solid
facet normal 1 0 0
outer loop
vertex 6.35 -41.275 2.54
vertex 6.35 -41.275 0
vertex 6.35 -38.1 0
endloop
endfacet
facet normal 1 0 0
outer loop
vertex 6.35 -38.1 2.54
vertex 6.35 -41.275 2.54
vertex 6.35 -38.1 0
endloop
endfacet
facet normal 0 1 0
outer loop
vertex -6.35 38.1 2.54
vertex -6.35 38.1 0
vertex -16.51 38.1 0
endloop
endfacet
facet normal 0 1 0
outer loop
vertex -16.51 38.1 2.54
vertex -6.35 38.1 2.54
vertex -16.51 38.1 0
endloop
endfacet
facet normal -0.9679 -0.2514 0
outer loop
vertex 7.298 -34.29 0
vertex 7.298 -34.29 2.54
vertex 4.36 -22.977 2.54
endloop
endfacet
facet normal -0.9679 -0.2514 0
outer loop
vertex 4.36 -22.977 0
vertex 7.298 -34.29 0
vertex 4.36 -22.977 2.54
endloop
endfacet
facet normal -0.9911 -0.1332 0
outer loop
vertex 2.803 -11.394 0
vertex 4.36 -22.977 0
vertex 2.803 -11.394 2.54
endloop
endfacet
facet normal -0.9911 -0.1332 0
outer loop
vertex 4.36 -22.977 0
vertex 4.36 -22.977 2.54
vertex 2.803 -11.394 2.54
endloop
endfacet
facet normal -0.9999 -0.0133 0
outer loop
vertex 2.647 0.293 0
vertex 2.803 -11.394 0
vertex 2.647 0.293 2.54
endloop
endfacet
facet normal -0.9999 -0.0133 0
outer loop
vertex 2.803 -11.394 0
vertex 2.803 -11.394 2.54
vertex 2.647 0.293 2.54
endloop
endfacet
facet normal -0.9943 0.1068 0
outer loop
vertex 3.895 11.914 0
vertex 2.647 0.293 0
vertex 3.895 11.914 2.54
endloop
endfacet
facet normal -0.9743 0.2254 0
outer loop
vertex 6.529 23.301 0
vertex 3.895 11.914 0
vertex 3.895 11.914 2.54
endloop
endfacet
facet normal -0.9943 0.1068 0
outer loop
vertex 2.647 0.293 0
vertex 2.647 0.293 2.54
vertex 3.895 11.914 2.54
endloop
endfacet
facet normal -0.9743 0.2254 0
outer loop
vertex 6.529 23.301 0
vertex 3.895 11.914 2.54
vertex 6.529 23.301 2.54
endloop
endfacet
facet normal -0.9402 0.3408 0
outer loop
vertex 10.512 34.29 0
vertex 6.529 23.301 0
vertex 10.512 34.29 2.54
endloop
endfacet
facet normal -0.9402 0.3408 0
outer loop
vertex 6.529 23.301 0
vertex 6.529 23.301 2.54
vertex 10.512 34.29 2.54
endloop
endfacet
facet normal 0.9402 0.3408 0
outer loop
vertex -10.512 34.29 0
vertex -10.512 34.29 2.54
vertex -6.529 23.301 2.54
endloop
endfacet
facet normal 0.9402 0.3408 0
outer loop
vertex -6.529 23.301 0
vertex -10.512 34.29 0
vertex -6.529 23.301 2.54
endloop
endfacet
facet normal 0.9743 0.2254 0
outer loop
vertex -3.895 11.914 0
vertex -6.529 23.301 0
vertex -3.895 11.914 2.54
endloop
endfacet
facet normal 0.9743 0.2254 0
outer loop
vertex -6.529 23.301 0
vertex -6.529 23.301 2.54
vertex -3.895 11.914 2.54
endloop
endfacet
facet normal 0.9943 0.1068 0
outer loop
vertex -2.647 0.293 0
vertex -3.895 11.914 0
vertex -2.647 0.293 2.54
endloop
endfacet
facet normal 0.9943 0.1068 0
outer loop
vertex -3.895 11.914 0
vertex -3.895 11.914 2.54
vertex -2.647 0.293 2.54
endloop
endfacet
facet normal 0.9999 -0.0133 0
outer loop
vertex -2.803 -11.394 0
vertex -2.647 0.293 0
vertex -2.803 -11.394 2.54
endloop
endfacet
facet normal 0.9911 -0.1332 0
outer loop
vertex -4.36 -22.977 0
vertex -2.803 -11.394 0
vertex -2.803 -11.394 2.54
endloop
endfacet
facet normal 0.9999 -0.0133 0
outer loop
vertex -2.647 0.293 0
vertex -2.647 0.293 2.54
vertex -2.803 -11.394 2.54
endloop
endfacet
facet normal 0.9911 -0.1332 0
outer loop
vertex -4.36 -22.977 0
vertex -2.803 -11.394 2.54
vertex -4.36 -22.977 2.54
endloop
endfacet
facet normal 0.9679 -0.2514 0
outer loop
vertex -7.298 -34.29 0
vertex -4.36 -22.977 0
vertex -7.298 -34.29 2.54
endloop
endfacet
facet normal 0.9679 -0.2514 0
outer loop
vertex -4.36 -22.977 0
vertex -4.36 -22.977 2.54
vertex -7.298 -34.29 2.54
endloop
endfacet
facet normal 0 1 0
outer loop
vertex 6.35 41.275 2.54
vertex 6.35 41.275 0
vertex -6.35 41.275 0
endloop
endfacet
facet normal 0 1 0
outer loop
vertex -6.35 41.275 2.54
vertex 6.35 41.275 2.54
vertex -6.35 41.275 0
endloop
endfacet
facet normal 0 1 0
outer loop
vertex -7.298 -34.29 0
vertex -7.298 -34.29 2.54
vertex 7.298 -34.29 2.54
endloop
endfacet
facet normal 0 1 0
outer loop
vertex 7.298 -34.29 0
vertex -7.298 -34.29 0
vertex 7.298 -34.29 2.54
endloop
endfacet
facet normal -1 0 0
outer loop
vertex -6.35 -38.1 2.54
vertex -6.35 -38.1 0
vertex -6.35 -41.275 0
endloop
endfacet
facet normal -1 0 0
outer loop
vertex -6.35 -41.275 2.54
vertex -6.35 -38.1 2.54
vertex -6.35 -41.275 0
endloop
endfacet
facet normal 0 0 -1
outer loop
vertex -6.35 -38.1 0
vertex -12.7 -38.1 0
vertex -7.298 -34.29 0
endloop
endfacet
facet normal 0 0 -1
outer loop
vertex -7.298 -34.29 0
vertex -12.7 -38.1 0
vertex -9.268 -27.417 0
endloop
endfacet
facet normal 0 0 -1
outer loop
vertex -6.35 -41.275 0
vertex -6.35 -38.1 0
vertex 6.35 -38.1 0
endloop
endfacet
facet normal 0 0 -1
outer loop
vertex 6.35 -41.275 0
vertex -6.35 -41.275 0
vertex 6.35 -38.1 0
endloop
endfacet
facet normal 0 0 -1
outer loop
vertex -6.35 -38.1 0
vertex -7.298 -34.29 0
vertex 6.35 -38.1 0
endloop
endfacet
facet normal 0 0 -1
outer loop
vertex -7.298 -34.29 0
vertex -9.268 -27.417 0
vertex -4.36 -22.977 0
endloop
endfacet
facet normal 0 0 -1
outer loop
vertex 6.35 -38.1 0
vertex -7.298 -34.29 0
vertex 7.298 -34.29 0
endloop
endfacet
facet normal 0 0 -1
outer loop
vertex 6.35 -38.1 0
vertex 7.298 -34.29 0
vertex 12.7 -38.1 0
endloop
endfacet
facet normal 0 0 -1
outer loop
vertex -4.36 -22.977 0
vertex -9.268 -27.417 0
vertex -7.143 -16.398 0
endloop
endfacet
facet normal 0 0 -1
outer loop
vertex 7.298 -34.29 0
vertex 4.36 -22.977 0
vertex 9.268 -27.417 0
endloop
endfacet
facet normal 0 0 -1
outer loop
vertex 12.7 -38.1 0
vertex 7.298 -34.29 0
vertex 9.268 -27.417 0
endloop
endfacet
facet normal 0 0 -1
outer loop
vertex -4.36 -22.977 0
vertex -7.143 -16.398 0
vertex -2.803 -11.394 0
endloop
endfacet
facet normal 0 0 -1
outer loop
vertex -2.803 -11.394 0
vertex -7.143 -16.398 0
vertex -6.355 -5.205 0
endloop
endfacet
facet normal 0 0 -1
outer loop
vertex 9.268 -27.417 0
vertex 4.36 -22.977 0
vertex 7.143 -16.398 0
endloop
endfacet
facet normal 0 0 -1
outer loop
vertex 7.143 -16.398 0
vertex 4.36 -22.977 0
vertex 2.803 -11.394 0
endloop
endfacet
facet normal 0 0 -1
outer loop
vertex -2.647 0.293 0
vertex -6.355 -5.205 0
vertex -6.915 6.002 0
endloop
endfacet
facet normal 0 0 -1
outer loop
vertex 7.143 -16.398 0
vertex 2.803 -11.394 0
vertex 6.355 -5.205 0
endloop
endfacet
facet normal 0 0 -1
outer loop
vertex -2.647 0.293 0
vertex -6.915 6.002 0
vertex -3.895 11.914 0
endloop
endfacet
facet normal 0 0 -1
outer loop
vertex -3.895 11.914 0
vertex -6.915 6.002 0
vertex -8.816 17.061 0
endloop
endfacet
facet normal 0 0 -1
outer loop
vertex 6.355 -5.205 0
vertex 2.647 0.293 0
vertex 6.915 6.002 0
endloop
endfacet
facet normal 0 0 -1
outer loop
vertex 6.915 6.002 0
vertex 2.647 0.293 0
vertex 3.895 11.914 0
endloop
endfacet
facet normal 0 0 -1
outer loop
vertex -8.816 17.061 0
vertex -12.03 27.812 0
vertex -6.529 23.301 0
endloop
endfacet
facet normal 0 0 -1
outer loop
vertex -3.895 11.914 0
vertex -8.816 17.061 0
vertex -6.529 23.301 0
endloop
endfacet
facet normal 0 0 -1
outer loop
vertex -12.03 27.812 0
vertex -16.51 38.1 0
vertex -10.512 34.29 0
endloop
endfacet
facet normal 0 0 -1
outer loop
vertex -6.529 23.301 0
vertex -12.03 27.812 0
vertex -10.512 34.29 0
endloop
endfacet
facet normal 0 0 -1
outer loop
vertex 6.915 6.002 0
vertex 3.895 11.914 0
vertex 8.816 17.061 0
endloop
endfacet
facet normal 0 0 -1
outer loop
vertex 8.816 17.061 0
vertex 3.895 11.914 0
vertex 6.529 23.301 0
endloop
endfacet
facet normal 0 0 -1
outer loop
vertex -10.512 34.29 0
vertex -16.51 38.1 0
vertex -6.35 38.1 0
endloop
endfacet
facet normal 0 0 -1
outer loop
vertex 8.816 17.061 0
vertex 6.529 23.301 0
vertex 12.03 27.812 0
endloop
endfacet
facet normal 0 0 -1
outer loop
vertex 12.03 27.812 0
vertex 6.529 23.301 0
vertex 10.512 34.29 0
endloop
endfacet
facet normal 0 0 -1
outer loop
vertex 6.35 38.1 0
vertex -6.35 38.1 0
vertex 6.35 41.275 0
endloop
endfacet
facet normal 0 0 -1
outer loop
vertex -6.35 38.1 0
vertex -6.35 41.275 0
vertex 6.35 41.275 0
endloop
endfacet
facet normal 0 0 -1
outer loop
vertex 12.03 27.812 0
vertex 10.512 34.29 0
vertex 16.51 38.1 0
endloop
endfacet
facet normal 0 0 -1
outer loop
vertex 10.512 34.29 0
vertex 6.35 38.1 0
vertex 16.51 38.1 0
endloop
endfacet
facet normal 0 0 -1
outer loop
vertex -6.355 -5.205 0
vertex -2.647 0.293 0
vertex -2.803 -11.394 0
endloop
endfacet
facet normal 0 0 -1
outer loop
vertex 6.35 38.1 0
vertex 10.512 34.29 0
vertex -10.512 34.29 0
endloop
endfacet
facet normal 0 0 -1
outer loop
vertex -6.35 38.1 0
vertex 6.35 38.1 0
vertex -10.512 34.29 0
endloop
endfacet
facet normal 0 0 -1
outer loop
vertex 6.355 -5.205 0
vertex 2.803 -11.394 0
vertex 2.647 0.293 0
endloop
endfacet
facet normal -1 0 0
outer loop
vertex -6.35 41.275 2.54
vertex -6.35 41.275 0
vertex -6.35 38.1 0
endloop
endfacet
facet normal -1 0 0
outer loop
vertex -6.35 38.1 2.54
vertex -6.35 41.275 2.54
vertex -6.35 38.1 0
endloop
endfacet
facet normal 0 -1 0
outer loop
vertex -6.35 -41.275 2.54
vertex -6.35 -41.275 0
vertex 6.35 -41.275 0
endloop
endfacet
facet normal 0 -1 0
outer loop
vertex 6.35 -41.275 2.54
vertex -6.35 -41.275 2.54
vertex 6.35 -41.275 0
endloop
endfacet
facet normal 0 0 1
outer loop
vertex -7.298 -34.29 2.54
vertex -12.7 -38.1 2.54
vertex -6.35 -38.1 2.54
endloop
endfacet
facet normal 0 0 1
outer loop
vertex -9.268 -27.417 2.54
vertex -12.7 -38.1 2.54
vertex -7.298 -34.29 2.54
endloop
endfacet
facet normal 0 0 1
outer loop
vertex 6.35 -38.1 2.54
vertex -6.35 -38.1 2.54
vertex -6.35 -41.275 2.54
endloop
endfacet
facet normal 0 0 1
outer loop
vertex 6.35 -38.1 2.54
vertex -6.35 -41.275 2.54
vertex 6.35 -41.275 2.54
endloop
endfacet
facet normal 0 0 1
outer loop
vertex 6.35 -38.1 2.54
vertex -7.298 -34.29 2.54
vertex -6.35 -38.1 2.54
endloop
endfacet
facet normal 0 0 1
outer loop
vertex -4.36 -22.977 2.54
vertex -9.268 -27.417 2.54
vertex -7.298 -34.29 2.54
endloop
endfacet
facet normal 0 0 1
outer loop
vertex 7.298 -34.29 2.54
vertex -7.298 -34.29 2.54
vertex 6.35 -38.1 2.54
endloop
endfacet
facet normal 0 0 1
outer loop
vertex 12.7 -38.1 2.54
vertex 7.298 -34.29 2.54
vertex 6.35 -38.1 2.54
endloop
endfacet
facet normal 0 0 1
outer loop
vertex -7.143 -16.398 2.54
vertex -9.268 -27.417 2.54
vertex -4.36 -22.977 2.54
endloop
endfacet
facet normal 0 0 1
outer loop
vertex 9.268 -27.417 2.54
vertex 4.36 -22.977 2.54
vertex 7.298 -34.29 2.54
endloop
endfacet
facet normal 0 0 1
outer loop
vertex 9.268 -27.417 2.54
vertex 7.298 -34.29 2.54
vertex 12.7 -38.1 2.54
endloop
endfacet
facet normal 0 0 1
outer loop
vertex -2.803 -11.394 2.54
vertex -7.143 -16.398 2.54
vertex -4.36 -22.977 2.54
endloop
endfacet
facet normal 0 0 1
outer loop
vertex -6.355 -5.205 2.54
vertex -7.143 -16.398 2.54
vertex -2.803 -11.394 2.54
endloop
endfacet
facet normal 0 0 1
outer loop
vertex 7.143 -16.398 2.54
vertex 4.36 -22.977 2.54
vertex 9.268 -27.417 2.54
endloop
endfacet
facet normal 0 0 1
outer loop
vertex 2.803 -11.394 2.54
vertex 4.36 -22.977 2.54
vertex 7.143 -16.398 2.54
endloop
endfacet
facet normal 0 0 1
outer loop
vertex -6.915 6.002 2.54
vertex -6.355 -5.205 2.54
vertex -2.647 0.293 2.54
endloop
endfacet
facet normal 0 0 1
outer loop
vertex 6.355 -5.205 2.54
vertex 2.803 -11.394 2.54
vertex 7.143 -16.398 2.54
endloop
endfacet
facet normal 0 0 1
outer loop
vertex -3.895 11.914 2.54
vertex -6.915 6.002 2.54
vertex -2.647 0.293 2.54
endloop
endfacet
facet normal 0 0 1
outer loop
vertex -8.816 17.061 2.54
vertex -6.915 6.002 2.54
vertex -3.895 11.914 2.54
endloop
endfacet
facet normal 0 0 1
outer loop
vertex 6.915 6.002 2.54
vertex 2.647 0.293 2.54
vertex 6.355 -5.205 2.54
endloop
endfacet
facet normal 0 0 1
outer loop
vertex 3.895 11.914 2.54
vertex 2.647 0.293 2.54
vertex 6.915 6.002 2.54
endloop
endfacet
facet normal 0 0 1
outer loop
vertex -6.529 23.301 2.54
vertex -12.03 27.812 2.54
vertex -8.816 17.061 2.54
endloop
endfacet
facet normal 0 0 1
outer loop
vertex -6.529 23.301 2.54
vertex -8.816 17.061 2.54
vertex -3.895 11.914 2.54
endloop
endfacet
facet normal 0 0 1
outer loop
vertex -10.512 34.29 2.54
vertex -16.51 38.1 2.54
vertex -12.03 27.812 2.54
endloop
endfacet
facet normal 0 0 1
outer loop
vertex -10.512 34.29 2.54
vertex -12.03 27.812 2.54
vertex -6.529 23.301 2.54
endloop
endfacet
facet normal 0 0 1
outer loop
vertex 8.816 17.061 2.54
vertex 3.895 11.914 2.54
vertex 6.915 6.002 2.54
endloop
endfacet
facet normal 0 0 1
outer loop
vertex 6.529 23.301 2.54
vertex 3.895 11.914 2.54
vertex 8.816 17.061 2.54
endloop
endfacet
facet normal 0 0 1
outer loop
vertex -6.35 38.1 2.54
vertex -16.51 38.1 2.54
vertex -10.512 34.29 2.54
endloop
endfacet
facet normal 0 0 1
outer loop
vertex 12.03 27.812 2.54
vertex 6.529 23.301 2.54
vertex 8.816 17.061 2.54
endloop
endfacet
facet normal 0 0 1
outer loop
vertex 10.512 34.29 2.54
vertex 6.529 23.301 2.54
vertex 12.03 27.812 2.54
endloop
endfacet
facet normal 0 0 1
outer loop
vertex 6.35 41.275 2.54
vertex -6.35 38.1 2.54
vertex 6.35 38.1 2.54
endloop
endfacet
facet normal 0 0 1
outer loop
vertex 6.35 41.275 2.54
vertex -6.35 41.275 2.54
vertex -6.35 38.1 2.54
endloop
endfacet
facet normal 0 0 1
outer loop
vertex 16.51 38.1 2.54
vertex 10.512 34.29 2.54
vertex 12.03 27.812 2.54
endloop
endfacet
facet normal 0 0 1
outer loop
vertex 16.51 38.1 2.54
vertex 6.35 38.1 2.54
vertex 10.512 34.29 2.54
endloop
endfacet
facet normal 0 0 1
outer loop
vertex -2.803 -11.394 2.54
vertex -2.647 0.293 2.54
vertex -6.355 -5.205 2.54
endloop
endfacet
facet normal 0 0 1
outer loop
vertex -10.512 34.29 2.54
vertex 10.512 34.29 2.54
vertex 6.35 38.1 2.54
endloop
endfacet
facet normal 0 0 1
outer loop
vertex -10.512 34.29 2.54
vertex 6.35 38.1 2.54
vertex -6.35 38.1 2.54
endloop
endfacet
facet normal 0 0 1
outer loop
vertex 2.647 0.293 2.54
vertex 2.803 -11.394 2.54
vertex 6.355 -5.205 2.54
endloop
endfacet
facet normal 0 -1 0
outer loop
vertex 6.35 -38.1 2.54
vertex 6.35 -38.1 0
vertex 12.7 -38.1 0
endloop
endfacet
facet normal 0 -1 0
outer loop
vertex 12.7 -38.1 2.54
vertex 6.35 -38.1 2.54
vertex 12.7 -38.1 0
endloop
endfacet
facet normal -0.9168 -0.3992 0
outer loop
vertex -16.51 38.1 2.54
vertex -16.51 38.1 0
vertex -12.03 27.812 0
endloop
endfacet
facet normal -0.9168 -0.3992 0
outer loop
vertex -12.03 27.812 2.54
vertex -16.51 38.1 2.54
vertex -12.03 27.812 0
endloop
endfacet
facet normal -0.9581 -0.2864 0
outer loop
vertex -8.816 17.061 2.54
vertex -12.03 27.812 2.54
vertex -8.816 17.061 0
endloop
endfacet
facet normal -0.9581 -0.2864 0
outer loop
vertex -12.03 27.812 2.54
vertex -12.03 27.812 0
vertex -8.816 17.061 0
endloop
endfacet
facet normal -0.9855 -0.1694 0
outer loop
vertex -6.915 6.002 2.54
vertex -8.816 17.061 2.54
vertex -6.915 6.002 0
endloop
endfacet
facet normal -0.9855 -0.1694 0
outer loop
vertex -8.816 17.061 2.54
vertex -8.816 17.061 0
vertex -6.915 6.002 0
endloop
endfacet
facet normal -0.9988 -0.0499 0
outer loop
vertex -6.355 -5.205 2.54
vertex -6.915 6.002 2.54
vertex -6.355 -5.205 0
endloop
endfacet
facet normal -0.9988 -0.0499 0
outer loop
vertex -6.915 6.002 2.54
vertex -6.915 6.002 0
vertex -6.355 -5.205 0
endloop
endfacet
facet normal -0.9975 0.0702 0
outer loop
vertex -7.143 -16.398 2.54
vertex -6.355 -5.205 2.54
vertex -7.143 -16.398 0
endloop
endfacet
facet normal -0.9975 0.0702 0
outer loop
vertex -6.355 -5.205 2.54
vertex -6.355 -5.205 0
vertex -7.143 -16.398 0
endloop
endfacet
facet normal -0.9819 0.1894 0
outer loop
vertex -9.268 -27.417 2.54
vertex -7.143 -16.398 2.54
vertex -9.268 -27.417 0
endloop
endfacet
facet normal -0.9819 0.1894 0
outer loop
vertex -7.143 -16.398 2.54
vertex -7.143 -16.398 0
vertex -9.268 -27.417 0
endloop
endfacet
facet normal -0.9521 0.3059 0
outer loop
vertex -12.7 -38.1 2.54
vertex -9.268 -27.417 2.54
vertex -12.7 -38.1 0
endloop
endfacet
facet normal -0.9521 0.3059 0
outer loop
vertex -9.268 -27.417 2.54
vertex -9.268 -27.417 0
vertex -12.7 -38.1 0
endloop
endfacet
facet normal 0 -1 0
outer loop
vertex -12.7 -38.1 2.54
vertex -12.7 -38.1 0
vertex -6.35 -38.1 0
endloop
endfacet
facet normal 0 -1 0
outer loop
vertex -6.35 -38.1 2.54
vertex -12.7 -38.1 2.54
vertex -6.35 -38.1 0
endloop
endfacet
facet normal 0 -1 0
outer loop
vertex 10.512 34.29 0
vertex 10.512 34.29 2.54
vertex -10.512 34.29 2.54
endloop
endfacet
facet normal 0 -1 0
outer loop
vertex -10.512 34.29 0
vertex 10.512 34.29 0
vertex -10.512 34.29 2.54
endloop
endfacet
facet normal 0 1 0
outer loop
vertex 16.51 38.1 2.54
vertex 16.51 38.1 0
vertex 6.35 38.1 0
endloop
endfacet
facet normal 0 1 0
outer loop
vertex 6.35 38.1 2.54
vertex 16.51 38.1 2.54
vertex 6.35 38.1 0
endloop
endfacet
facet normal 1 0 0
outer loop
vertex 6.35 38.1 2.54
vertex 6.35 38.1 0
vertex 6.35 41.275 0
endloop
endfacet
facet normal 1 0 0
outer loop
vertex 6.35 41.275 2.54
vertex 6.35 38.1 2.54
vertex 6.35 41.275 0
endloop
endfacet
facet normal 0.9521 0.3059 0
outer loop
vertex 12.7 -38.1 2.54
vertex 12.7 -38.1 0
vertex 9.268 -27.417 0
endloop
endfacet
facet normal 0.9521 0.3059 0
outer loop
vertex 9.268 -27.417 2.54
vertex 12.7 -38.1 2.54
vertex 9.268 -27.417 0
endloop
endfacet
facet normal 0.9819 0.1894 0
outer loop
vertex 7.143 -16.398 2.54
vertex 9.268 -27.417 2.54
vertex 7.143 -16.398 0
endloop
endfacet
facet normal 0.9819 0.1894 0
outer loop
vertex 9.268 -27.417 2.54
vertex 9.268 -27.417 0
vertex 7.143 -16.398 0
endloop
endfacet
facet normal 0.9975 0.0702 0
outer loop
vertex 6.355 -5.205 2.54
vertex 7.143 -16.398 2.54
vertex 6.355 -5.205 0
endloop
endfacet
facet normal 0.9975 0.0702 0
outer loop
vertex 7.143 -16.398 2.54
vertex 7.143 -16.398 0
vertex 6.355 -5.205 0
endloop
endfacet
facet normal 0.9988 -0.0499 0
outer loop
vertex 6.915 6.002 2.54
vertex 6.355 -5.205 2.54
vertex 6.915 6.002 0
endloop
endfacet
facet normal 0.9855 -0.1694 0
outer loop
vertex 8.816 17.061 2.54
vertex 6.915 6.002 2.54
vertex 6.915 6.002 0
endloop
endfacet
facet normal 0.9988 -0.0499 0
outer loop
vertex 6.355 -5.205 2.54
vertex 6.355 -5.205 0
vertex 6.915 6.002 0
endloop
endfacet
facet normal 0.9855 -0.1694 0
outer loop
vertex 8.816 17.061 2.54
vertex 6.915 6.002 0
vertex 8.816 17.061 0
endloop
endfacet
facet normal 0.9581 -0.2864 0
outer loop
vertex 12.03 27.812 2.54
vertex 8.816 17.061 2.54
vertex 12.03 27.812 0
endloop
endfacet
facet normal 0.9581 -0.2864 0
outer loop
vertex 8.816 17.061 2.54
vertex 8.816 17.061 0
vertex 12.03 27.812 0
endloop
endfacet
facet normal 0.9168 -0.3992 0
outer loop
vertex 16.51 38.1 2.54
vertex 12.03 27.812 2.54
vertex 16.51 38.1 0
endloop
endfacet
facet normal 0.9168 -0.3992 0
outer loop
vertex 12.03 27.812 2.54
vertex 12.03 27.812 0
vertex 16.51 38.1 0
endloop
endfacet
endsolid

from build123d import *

# Parameters (mm, degrees)
F1_DEPTH = 2.54
F3_DEPTH = 2.54


with BuildPart() as f1:
    # F0 (on Top) → F1 (new body)
    with BuildSketch(Plane.XY):
        with BuildLine():
            ThreePointArc((-16.51, 38.1), (-6.466491, 0.406925), (-12.7, -38.1))
            Line((-12.7, -38.1), (-6.35, -38.1))
            Line((-6.35, -38.1), (-6.35, -41.275))
            Line((-6.35, -41.275), (6.35, -41.275))
            Line((6.35, -41.275), (6.35, -38.1))
            Line((6.35, -38.1), (12.7, -38.1))
            ThreePointArc((12.7, -38.1), (6.466491, 0.406925), (16.51, 38.1))
            Line((16.51, 38.1), (6.35, 38.1))
            Line((6.35, 38.1), (6.35, 41.275))
            Line((6.35, 41.275), (-6.35, 41.275))
            Line((-6.35, 41.275), (-6.35, 38.1))
            Line((-6.35, 38.1), (-16.51, 38.1))
        make_face()
    extrude(amount=F1_DEPTH)

    # F2 (on face) → F3 (cut, through all)
    with BuildSketch(Plane.XY.offset(2.54)):
        with BuildLine():
            ThreePointArc((-10.511564, 34.29), (-2.646525, 0.293267), (-7.297803, -34.29))
            Line((-7.297803, -34.29), (7.297803, -34.29))
            ThreePointArc((7.297803, -34.29), (2.646525, 0.293267), (10.511564, 34.29))
            Line((10.511564, 34.29), (-10.511564, 34.29))
        make_face()
    extrude(amount=-F3_DEPTH, mode=Mode.SUBTRACT)


solid = f1.part
